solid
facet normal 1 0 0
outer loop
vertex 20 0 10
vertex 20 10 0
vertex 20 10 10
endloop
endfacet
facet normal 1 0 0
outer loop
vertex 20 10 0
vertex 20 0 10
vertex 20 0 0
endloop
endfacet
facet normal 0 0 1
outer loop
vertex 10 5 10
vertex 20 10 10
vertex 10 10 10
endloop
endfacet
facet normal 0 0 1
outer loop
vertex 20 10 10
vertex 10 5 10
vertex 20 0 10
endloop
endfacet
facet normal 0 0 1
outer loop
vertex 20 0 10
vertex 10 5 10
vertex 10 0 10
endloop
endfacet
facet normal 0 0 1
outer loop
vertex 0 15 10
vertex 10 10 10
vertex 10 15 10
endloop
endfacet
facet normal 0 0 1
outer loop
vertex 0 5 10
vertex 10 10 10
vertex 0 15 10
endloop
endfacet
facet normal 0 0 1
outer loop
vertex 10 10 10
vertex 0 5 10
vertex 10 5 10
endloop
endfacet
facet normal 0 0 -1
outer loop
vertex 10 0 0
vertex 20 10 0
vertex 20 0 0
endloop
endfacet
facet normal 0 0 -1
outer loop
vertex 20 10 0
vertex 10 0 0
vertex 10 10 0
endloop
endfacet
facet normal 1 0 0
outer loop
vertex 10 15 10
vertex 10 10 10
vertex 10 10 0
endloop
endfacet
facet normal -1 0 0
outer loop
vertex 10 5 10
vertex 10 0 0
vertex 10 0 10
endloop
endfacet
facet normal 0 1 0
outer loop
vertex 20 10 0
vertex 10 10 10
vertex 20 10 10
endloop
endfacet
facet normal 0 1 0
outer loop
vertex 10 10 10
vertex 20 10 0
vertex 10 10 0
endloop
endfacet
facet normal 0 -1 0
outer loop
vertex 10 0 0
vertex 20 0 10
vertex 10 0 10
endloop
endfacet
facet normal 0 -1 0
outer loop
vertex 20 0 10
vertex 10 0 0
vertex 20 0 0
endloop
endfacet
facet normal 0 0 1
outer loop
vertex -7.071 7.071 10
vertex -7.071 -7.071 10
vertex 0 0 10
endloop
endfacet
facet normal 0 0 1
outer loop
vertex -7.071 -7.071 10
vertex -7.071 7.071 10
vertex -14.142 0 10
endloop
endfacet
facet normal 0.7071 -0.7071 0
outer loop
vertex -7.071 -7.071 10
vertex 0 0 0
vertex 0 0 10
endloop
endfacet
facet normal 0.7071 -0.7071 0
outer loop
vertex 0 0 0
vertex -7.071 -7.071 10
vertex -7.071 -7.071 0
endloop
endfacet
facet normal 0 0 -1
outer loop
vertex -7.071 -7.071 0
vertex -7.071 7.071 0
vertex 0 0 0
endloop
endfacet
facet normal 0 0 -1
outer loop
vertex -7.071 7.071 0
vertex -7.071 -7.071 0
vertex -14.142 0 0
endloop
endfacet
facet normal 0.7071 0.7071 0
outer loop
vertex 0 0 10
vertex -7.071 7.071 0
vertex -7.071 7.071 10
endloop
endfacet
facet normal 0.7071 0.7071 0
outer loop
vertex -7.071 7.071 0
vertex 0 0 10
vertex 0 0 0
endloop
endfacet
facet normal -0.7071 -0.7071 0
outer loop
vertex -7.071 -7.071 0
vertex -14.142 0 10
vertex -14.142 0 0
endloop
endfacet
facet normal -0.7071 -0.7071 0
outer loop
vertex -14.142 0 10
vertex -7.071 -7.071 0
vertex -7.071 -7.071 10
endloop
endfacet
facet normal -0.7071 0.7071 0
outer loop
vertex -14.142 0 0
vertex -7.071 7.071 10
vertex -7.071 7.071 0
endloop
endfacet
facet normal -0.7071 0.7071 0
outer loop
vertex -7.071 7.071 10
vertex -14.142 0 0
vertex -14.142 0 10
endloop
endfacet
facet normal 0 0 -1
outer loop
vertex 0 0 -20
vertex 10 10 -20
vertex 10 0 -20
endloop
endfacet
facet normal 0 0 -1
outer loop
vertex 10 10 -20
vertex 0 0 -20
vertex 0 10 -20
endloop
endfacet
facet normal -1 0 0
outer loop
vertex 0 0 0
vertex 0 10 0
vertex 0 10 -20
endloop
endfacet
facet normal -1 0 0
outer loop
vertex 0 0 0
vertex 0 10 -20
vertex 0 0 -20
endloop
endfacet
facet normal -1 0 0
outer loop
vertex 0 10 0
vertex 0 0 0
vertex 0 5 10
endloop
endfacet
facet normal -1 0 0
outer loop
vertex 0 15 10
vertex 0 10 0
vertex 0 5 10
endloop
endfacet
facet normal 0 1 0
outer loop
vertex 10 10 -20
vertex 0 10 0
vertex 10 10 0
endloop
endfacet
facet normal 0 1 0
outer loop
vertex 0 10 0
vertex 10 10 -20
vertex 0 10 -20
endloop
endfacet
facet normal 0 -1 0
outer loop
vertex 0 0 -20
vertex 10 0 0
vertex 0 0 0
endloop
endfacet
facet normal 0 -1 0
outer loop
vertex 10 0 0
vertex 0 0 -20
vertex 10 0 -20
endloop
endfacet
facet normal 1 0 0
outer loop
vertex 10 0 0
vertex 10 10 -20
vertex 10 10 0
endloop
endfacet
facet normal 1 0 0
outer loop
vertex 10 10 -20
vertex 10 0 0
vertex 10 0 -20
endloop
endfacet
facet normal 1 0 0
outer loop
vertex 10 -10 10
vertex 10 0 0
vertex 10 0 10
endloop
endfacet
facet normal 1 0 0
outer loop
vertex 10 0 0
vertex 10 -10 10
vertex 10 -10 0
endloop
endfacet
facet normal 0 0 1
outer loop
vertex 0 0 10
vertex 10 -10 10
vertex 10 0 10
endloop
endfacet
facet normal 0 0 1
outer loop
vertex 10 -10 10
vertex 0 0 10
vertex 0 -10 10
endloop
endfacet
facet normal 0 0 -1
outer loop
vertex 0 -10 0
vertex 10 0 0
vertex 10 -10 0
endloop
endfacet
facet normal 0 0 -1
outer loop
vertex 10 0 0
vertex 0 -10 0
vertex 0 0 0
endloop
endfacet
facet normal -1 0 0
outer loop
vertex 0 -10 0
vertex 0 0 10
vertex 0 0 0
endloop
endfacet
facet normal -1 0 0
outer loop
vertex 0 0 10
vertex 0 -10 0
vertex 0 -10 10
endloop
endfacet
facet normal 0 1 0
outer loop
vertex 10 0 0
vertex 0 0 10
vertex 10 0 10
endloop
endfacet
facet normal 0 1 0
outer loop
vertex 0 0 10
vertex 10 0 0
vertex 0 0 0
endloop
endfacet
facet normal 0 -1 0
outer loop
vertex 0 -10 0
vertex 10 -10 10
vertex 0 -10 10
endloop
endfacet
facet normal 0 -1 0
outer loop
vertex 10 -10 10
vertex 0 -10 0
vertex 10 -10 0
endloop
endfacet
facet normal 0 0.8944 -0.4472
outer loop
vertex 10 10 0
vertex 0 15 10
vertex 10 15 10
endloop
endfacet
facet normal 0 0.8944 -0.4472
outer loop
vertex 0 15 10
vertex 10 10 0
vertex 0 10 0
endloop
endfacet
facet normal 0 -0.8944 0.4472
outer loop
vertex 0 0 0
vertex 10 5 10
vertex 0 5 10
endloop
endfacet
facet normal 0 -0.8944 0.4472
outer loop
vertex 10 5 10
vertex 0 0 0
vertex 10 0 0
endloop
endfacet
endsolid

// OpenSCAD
// file: handyfunctions.scad
module dx(n) {
  translate([n, 0, 0]) children();
}

module dy(n) {
  translate([0, n, 0]) children();
}

module dz(n) {
  translate([0, 0, n]) children();
}

module mx() {
  mirror([1, 0, 0]) children();
}

module my() {
  mirror([0, 1, 0]) children();
}

module mz() {
  mirror([0, 0, 1]) children();
}

module rx(n) {
  rotate([n, 0, 0]) children();
}

module ry(n) {
  rotate([0, n, 0]) children();
}

module rz(n) {
  rotate([0, 0, n]) children();
}

module sx(n) {
  scale([n, 1, 1]) children();
}

module sy(n) {
  scale([1, n, 1]) children();
}

module sz(n) {
  scale([1, 1, n]) children();
}

module skewxy(n) {
  multmatrix(m = [[1, n, 0, 0], [0, 1, 0, 0], [0, 0, 1, 0]]) children();
}

module skewxz(n) {
  multmatrix(m = [[1, 0, n, 0], [0, 1, 0, 0], [0, 0, 1, 0]]) children();
}

module skewyx(n) {
  multmatrix(m = [[1, 0, 0, 0], [n, 1, 0, 0], [0, 0, 1, 0]]) children();
}

module skewyz(n) {
  multmatrix(m = [[1, 0, 0, 0], [0, 1, n, 0], [0, 0, 1, 0]]) children();
}

module skewzx(n) {
  multmatrix(m = [[1, 0, 0, 0], [0, 1, 0, 0], [n, 0, 1, 0]]) children();
}

module skewzy(n) {
  multmatrix(m = [[1, 0, 0, 0], [0, 1, 0, 0], [0, n, 1, 0]]) children();
}
// main file
// OpenSCADvent Handy functions examples
// Space Buck, December 2020

// This is the line that makes the magic happen:
include <handyfunctions.scad>;

// To translate a shape along x, y, or z, use dx(n), dy(n), dz(n)
color("red") dx(10) cube(10);

// To rotate a shape around the x-axis, y-axis, or z-axis, use rx(n), ry(n), rz(n)
color("green") rz(135) cube(10);

// To scale a shape along x, y, or z, use sx(n), sy(n), sz(n)
color("pink") sz(-2) cube(10);

// To mirror a shape across the x-axis, y-axis, or z-axis, use mx(), my(), mz()
color("blue") my() cube(10);

// To skew a shape, use skewxy(n), skewxz(n), skewyx(n), skewyz(n), skewzx(n), skewzy(n)
color("purple") skewyz(.5) cube(10) ;
